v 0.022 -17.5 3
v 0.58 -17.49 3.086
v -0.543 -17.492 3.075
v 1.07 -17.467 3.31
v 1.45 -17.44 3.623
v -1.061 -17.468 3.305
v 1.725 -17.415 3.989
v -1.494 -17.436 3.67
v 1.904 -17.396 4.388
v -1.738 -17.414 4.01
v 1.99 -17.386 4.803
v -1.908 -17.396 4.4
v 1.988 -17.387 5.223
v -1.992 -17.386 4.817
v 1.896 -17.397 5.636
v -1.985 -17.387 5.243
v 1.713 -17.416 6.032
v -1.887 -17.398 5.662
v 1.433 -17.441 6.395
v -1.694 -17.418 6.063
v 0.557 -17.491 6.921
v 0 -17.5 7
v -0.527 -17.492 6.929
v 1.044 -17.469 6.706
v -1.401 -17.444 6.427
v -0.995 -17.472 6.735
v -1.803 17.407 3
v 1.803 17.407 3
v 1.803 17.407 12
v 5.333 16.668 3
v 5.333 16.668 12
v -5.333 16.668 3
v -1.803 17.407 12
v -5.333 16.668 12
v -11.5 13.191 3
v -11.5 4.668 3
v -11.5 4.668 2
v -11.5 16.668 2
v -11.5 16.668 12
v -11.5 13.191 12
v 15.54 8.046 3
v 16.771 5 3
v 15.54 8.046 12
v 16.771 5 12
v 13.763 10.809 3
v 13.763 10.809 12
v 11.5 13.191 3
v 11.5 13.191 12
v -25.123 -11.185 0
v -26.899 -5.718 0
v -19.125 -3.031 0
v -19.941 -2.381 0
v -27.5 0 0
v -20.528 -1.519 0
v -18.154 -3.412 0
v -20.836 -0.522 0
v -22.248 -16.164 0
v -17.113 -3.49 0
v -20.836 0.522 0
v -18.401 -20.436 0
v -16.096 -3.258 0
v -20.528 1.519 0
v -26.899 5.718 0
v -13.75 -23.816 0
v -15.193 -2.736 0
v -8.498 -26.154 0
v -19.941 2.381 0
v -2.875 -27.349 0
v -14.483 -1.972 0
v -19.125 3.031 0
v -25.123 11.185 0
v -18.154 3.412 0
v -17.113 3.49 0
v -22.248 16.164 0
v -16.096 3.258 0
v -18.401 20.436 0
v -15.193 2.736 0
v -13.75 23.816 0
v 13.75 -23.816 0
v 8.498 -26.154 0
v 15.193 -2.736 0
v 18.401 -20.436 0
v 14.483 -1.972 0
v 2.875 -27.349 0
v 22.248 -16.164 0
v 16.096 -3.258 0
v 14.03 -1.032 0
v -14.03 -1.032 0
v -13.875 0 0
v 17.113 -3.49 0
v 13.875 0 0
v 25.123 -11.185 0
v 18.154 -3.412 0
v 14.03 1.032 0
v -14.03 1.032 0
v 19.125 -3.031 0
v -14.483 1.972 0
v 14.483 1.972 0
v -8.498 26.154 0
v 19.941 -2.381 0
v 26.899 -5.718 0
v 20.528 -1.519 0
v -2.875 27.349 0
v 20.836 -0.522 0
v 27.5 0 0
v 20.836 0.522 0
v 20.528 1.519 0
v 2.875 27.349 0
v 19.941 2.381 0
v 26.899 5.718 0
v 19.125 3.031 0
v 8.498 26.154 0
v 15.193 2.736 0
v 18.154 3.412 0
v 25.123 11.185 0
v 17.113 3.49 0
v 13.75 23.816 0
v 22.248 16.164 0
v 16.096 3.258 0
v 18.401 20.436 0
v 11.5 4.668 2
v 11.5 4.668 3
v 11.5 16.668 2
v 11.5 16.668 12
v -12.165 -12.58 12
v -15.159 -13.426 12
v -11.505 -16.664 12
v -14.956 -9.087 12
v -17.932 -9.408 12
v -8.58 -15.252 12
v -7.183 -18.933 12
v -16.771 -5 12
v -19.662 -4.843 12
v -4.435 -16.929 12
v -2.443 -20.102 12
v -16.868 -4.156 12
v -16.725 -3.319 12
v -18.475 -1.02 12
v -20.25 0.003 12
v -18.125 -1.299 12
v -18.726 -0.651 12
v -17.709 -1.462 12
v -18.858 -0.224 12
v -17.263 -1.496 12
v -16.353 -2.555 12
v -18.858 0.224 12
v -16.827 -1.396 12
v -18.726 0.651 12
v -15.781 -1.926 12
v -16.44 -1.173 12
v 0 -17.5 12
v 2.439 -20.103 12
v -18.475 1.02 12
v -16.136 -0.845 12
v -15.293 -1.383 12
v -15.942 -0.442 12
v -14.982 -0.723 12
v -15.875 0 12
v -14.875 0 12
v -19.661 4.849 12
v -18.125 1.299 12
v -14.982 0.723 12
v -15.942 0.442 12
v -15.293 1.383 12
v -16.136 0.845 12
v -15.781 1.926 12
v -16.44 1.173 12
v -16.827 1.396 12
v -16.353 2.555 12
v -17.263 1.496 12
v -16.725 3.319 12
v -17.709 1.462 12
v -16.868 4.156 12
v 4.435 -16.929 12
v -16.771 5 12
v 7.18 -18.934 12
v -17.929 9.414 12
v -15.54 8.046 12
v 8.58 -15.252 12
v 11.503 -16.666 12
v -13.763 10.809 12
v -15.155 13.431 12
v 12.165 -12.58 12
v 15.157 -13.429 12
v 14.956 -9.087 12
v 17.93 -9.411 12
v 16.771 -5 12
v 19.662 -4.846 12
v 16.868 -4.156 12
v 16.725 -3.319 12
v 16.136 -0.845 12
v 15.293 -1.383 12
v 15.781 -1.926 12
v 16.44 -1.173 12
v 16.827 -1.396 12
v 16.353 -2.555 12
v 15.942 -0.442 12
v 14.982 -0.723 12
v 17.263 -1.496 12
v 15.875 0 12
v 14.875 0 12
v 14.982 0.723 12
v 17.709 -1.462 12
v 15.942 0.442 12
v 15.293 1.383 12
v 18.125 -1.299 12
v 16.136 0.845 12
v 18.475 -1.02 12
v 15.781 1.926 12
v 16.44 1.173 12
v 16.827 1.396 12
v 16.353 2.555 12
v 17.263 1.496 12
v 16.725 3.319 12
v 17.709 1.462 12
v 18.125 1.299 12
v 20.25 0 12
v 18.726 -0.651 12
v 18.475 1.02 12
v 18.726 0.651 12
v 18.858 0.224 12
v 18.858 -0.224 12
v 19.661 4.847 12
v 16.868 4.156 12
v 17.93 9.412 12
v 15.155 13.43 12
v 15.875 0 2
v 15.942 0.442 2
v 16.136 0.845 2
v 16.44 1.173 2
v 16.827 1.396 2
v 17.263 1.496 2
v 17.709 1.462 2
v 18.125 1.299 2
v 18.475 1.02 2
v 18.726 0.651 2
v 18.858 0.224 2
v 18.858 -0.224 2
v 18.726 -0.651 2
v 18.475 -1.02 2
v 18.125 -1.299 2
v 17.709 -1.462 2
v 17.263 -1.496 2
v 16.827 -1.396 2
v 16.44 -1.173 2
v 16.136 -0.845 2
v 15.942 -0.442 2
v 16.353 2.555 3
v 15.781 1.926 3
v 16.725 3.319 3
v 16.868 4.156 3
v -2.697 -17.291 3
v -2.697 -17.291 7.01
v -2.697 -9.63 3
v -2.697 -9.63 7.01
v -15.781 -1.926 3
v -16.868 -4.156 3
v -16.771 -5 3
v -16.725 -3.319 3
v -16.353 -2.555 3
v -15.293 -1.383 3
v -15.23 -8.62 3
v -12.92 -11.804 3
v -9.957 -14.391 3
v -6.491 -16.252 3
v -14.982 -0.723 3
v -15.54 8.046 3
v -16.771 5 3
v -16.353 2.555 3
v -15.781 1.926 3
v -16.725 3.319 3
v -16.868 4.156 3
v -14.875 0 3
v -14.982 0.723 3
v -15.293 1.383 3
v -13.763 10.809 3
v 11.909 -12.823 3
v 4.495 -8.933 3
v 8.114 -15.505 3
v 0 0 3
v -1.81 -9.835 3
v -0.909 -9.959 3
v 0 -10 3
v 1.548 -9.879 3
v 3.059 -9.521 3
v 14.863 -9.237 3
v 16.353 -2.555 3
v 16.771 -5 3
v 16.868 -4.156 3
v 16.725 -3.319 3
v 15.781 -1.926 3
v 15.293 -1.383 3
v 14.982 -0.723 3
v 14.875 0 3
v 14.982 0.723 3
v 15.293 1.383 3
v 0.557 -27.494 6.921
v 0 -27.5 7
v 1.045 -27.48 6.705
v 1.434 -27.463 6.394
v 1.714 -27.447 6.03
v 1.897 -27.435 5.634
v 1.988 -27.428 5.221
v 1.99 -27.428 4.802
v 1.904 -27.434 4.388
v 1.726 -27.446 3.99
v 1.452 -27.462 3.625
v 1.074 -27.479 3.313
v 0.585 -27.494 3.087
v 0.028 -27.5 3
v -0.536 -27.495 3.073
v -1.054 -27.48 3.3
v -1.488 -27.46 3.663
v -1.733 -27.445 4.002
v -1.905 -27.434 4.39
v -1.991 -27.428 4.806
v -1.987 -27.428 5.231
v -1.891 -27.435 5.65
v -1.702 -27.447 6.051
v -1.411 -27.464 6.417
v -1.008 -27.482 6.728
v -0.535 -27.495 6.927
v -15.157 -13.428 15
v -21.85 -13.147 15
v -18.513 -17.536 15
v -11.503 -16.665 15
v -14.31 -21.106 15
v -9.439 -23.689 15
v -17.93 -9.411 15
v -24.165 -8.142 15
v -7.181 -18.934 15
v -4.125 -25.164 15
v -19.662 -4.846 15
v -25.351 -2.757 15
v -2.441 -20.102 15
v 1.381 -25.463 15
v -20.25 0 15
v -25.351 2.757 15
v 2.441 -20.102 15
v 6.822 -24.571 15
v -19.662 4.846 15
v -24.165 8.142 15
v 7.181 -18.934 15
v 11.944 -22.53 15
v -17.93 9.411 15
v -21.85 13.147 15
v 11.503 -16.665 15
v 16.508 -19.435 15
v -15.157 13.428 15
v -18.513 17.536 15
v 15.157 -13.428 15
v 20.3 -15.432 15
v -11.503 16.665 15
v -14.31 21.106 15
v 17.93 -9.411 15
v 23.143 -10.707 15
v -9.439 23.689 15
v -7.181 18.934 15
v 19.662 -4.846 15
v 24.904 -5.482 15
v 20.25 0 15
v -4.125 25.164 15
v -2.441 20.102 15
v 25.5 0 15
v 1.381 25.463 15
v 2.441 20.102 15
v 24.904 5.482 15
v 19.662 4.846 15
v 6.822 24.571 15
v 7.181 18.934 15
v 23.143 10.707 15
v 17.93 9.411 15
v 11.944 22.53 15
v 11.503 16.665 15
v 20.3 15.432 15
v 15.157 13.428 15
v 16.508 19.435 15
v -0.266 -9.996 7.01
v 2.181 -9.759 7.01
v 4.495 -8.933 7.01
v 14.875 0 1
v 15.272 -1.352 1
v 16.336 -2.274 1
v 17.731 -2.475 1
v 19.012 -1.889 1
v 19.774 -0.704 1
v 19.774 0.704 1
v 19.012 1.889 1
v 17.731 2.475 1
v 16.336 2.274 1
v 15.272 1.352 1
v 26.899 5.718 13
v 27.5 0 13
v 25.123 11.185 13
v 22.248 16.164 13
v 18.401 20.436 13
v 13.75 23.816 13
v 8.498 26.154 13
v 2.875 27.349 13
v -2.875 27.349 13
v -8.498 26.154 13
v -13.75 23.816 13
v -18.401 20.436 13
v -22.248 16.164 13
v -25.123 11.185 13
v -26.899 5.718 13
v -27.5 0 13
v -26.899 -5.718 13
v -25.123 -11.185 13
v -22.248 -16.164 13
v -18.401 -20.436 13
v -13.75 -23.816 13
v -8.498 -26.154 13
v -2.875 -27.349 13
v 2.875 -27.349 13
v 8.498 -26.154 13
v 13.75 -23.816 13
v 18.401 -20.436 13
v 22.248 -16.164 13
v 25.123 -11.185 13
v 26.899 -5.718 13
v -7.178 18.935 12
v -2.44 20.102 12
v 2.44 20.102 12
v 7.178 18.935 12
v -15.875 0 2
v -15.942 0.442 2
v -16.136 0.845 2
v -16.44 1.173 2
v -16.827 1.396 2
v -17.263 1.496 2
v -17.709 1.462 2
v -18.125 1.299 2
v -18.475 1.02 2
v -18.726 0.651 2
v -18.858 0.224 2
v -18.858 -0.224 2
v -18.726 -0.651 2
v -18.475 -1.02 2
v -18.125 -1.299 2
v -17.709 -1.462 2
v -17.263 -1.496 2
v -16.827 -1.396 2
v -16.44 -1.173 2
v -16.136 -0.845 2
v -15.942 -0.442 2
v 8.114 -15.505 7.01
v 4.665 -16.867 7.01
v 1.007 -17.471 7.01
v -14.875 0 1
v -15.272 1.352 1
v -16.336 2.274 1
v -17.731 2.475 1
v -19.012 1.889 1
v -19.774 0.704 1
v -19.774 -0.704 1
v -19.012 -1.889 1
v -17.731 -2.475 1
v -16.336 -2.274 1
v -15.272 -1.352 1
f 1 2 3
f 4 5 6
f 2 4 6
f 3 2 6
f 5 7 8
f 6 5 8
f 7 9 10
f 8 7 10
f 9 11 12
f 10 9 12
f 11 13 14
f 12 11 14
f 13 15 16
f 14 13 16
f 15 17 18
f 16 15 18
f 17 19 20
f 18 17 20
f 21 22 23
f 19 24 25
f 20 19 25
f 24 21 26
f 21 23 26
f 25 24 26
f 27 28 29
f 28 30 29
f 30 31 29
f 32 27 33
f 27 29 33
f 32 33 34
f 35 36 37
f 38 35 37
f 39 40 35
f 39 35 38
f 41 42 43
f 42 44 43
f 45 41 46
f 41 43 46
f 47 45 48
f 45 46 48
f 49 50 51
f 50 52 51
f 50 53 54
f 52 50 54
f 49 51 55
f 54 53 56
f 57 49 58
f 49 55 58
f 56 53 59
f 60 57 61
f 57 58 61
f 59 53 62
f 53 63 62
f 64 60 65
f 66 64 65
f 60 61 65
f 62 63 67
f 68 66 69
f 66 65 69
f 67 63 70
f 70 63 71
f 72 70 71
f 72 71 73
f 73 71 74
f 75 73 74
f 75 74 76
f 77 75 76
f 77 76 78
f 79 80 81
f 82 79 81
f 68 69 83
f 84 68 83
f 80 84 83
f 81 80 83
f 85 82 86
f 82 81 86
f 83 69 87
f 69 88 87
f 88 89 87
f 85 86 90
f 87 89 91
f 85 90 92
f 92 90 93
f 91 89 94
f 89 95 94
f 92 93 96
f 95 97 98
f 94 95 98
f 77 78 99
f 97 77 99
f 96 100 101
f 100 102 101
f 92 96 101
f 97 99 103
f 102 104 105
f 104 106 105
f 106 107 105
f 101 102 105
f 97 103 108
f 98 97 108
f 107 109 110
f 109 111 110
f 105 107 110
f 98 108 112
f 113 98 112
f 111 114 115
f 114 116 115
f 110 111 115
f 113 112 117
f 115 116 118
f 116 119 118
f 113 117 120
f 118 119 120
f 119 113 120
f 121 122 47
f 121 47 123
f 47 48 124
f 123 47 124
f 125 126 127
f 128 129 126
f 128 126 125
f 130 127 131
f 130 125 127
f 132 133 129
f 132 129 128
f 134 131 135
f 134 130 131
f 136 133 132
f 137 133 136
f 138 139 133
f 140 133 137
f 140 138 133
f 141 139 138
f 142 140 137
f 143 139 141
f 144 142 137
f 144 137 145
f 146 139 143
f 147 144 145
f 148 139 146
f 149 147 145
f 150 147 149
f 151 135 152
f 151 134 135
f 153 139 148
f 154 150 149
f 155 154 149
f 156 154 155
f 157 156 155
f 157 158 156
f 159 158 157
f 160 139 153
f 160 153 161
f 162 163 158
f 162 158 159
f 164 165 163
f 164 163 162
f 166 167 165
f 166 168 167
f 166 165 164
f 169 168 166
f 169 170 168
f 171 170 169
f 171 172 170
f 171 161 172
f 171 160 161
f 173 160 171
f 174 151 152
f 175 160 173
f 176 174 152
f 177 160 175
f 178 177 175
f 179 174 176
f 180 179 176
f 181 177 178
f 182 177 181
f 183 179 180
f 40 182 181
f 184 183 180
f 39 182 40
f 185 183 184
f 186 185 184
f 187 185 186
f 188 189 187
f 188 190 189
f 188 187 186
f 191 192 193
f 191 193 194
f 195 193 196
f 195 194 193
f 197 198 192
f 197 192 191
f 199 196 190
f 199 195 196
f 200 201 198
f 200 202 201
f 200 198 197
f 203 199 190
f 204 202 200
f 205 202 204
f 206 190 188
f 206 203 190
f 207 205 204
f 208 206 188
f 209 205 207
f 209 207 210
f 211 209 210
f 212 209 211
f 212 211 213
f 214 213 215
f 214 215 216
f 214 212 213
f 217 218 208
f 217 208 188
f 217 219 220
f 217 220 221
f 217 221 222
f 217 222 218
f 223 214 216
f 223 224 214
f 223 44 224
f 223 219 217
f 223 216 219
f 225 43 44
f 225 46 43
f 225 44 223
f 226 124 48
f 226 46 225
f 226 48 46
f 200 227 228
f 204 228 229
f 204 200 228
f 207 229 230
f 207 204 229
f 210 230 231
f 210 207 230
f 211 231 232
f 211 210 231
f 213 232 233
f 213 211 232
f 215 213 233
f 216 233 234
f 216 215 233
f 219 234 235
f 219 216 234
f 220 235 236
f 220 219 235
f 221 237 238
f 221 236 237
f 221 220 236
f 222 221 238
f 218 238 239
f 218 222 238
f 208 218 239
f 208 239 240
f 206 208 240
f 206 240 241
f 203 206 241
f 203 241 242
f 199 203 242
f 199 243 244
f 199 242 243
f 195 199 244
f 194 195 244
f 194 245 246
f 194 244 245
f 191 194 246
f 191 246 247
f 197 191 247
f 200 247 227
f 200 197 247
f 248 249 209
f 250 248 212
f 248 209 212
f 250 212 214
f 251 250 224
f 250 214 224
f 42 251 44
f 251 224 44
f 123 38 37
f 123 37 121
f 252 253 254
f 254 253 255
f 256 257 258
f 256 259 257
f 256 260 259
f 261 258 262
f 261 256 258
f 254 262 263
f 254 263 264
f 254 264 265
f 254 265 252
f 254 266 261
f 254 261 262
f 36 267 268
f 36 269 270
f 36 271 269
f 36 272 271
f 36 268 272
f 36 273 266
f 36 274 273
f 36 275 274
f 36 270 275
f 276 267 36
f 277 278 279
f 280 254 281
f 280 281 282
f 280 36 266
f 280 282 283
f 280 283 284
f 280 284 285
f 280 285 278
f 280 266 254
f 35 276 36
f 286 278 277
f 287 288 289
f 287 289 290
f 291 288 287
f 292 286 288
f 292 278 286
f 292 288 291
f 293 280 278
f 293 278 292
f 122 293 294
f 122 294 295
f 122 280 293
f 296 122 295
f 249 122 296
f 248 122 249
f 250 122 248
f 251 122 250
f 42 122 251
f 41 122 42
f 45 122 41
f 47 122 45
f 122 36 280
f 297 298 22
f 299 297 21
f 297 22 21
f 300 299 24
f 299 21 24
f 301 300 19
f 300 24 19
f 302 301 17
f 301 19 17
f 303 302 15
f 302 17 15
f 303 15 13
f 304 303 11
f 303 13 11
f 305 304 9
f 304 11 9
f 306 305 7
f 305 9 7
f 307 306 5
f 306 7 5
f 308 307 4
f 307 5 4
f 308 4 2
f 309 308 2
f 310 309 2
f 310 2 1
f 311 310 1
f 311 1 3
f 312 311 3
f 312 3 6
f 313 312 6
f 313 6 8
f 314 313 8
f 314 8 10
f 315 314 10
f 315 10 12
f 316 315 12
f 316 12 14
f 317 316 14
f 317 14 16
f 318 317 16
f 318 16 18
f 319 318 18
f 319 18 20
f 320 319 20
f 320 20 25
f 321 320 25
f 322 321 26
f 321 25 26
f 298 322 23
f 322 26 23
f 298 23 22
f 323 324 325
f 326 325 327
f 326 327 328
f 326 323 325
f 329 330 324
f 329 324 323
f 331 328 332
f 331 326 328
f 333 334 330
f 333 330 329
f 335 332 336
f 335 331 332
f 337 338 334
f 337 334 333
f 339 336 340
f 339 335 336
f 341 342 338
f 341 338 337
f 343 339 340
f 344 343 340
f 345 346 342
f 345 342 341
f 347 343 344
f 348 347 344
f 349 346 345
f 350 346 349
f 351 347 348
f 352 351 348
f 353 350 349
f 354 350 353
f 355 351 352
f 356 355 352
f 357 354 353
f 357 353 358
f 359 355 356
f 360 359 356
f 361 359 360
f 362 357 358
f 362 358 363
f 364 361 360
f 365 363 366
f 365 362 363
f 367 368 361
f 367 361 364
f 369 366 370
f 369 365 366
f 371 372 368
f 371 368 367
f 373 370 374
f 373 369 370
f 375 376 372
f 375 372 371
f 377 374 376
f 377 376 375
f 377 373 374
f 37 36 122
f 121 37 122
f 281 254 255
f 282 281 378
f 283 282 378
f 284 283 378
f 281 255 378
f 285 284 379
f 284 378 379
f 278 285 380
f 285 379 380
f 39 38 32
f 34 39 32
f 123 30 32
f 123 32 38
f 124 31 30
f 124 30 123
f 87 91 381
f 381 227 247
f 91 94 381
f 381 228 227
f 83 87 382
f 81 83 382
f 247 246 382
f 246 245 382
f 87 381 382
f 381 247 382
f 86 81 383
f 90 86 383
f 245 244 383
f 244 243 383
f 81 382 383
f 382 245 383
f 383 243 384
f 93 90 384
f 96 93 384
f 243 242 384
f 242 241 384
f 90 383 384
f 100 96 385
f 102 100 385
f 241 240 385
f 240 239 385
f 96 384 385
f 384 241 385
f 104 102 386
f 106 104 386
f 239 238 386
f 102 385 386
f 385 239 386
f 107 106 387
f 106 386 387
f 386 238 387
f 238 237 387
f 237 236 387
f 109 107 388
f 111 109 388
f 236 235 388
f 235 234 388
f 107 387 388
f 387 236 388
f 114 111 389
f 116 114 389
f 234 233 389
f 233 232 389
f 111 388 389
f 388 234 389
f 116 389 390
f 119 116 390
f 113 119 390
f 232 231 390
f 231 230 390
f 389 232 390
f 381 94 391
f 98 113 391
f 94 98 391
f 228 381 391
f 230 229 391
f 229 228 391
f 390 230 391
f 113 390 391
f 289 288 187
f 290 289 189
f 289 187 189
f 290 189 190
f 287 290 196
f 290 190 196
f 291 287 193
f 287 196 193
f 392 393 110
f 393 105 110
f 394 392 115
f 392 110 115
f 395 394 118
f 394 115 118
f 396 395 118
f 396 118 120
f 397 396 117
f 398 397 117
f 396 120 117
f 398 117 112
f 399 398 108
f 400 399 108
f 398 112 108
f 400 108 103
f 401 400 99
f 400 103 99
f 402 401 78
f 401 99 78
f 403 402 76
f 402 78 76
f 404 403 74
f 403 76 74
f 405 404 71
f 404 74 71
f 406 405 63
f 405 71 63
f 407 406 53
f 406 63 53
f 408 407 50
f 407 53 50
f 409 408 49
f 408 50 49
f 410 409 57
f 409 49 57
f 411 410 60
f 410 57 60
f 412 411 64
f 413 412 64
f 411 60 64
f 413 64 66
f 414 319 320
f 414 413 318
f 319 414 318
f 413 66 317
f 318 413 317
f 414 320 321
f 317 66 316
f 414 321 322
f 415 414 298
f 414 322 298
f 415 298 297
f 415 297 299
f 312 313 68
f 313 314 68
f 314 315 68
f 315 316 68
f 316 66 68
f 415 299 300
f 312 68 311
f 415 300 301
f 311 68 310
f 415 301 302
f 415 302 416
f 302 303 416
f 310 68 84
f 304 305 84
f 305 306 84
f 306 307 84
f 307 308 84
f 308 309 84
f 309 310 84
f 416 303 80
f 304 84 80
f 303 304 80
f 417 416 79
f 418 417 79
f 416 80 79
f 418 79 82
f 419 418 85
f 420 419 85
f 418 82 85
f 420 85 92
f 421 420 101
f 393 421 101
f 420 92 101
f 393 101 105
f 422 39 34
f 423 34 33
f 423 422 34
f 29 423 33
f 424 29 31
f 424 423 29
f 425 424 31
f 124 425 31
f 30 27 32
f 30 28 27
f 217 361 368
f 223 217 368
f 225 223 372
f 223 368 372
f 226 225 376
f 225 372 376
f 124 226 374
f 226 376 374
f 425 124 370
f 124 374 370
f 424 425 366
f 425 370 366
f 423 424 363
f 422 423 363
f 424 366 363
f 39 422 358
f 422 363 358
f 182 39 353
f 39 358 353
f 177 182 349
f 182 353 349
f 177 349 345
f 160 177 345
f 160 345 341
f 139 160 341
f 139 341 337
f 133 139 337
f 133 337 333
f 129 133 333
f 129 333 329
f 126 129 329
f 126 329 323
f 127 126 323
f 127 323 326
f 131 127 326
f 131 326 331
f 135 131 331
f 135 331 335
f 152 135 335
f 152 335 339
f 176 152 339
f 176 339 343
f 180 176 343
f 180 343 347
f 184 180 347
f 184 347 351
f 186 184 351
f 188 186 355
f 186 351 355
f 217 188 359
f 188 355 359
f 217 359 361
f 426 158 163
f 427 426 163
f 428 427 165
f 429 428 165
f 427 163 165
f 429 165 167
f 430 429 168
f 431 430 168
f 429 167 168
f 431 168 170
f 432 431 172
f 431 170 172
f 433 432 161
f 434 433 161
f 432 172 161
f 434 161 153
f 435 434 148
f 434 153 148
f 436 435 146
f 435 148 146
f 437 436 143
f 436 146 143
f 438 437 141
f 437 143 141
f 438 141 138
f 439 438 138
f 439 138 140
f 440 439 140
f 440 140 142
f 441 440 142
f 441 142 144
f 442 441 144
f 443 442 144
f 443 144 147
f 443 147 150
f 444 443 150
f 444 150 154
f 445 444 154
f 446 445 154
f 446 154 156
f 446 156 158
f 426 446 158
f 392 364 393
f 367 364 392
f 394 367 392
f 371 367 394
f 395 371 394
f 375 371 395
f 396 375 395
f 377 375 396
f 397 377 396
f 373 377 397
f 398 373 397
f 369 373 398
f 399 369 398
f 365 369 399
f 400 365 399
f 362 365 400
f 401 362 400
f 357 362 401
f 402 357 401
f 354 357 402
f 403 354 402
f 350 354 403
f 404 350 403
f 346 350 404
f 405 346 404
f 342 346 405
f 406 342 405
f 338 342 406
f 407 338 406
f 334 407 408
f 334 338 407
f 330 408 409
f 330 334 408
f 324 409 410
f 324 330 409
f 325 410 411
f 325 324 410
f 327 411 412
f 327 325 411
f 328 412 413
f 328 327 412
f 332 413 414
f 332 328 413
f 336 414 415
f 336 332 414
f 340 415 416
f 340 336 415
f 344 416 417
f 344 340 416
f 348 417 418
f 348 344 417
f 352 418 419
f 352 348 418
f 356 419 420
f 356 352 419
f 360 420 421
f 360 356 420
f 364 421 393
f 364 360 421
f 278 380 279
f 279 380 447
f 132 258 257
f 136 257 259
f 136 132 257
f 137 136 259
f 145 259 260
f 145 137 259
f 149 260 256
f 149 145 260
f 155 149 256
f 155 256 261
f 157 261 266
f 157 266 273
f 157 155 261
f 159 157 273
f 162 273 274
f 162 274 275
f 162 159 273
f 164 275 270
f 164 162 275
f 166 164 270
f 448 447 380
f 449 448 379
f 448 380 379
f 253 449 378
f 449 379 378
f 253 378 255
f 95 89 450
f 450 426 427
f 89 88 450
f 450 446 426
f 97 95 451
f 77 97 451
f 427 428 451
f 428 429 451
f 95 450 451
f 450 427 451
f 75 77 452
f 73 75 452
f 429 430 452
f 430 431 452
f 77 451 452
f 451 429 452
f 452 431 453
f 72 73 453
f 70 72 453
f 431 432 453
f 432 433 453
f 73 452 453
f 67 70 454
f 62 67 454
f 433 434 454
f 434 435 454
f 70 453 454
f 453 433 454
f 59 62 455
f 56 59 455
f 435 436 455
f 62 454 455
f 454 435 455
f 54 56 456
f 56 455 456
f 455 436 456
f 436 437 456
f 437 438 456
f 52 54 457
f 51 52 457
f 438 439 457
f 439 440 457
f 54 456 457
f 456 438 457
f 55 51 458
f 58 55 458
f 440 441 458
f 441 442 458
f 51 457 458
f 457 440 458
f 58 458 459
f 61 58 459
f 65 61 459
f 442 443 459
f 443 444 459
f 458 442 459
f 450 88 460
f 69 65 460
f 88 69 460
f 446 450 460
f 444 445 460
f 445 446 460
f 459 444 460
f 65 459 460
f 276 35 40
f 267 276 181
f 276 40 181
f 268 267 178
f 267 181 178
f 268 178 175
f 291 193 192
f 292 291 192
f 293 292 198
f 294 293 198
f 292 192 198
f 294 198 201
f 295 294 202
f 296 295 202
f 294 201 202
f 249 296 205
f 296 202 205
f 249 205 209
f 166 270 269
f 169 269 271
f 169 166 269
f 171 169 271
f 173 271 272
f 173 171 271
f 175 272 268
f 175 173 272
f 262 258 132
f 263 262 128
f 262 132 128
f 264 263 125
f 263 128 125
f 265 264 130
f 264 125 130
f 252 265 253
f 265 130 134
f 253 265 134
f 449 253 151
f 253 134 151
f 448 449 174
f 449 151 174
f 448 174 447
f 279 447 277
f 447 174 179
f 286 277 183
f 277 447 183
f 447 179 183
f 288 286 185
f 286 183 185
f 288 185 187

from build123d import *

# Parameters (mm, degrees)
SKETCH1_R                = 27.5
BOSS_EXTRUDE1_DEPTH      = 15
CHAMFER1_SIZE            = 2
SKETCH2_R                = 17.5
CUT_EXTRUDE1_DEPTH       = 12
SKETCH3_R                = 20.25
CUT_EXTRUDE2_DEPTH       = 3
SKETCH4_R                = 2
CUT_EXTRUDE3_DEPTH       = 42.683330001
BOSS_EXTRUDE2_DEPTH      = 9
SKETCH6_R                = 1.5
CUT_EXTRUDE4_DEPTH       = 41.700123015
CHAMFER2_SIZE            = 2
CHAMFER2_OF_MIRROR1_SIZE = 2
BOSS_EXTRUDE8_START      = 4.01
BOSS_EXTRUDE8_DEPTH      = 4.01
SKETCH14_W               = 23
SKETCH14_H               = 12
CUT_EXTRUDE5_DEPTH       = 10


with BuildPart() as part:
    # Sketch1 → Boss-Extrude1 (new body)
    with BuildSketch(Plane.XY):
        Circle(SKETCH1_R)
    extrude(amount=BOSS_EXTRUDE1_DEPTH)

    # Chamfer1
    chamfer1_edges = [part.edges().sort_by_distance(p)[0] for p in [
        (-27.5, 0, 15),
    ]]
    chamfer(chamfer1_edges, length=CHAMFER1_SIZE)

    # Sketch2 → Cut-Extrude1 (cut)
    with BuildSketch(Plane.XY.offset(15)):
        Circle(SKETCH2_R)
    extrude(amount=-CUT_EXTRUDE1_DEPTH, mode=Mode.SUBTRACT)

    # Sketch3 → Cut-Extrude2 (cut)
    with BuildSketch(Plane.XY.offset(15)):
        Circle(SKETCH3_R)
    extrude(amount=-CUT_EXTRUDE2_DEPTH, mode=Mode.SUBTRACT)

    # Sketch4 → Cut-Extrude3 (cut, through all)
    with BuildSketch(Plane(origin=(0, 0, 0), x_dir=(1, 0, 0), z_dir=(0, 1, 0))):
        with Locations(Location((0, -5, 0), (0, 0, 270))):
            Circle(SKETCH4_R)
    extrude(amount=-CUT_EXTRUDE3_DEPTH, mode=Mode.SUBTRACT)

    # Sketch5 → Boss-Extrude2 (add)
    with BuildSketch(Plane.XY.offset(12)):
        with BuildLine():
            ThreePointArc((-15.781356255, -1.926213803), (-14.875, 0), (-15.781356255, 1.926213803))
            ThreePointArc((-15.781356255, 1.926213803), (-16.724757779, 3.318673761), (-16.770509831, 5))
            ThreePointArc((-16.770509831, 5), (-17.5, 0), (-16.770509831, -5))
            ThreePointArc((-16.770509831, -5), (-16.724757779, -3.318673761), (-15.781356255, -1.926213803))
        make_face()
    boss_extrude2 = extrude(amount=-BOSS_EXTRUDE2_DEPTH)

    # Sketch6 → Cut-Extrude4 (cut, through all)
    with BuildSketch(Plane.XY.offset(12)):
        with Locations((-17.375, 0)):
            Circle(SKETCH6_R)
    cut_extrude4 = extrude(amount=-CUT_EXTRUDE4_DEPTH, mode=Mode.SUBTRACT)

    # Chamfer2
    chamfer2_edges = [part.edges().sort_by_distance(p)[0] for p in [
        (-18.875, 0, 0),
    ]]
    chamfer(chamfer2_edges, length=CHAMFER2_SIZE)

    # Mirror1: Boss-Extrude2, Cut-Extrude4 across plane
    add(boss_extrude2.mirror(Plane(origin=(0, 0, 0), x_dir=(0, 0, 1), z_dir=(1, 0, 0))))
    add(cut_extrude4.mirror(Plane(origin=(0, 0, 0), x_dir=(0, 0, 1), z_dir=(1, 0, 0))), mode=Mode.SUBTRACT)

    # Chamfer2 of Mirror1
    chamfer2_of_mirror1_edges = [part.edges().sort_by_distance(p)[0] for p in [
        (18.875, 0, 0),
    ]]
    chamfer(chamfer2_of_mirror1_edges, length=CHAMFER2_OF_MIRROR1_SIZE)

    # Sketch8 → Boss-Extrude8 (add)
    with BuildSketch(Plane.XY.offset(3).offset(BOSS_EXTRUDE8_START)):
        with BuildLine():
            Line((-2.696676707, -17.29097842), (-2.696676707, -9.629534503))
            ThreePointArc((-2.696676707, -9.629534503), (0.96452096, -9.953376277), (4.495419158, -8.932592378))
            Line((4.495419158, -8.932592378), (8.114072505, -15.505219359))
            ThreePointArc((8.114072505, -15.505219359), (2.852065596, -17.266027969), (-2.696676707, -17.29097842))
        make_face()
    extrude(amount=-BOSS_EXTRUDE8_DEPTH)

    # Sketch14 → Cut-Extrude5 (cut)
    with BuildSketch(Plane.XY.offset(12)):
        with Locations((0, 10.667708301)):
            Rectangle(SKETCH14_W, SKETCH14_H)
    extrude(amount=-CUT_EXTRUDE5_DEPTH, mode=Mode.SUBTRACT)


solid = part.part
